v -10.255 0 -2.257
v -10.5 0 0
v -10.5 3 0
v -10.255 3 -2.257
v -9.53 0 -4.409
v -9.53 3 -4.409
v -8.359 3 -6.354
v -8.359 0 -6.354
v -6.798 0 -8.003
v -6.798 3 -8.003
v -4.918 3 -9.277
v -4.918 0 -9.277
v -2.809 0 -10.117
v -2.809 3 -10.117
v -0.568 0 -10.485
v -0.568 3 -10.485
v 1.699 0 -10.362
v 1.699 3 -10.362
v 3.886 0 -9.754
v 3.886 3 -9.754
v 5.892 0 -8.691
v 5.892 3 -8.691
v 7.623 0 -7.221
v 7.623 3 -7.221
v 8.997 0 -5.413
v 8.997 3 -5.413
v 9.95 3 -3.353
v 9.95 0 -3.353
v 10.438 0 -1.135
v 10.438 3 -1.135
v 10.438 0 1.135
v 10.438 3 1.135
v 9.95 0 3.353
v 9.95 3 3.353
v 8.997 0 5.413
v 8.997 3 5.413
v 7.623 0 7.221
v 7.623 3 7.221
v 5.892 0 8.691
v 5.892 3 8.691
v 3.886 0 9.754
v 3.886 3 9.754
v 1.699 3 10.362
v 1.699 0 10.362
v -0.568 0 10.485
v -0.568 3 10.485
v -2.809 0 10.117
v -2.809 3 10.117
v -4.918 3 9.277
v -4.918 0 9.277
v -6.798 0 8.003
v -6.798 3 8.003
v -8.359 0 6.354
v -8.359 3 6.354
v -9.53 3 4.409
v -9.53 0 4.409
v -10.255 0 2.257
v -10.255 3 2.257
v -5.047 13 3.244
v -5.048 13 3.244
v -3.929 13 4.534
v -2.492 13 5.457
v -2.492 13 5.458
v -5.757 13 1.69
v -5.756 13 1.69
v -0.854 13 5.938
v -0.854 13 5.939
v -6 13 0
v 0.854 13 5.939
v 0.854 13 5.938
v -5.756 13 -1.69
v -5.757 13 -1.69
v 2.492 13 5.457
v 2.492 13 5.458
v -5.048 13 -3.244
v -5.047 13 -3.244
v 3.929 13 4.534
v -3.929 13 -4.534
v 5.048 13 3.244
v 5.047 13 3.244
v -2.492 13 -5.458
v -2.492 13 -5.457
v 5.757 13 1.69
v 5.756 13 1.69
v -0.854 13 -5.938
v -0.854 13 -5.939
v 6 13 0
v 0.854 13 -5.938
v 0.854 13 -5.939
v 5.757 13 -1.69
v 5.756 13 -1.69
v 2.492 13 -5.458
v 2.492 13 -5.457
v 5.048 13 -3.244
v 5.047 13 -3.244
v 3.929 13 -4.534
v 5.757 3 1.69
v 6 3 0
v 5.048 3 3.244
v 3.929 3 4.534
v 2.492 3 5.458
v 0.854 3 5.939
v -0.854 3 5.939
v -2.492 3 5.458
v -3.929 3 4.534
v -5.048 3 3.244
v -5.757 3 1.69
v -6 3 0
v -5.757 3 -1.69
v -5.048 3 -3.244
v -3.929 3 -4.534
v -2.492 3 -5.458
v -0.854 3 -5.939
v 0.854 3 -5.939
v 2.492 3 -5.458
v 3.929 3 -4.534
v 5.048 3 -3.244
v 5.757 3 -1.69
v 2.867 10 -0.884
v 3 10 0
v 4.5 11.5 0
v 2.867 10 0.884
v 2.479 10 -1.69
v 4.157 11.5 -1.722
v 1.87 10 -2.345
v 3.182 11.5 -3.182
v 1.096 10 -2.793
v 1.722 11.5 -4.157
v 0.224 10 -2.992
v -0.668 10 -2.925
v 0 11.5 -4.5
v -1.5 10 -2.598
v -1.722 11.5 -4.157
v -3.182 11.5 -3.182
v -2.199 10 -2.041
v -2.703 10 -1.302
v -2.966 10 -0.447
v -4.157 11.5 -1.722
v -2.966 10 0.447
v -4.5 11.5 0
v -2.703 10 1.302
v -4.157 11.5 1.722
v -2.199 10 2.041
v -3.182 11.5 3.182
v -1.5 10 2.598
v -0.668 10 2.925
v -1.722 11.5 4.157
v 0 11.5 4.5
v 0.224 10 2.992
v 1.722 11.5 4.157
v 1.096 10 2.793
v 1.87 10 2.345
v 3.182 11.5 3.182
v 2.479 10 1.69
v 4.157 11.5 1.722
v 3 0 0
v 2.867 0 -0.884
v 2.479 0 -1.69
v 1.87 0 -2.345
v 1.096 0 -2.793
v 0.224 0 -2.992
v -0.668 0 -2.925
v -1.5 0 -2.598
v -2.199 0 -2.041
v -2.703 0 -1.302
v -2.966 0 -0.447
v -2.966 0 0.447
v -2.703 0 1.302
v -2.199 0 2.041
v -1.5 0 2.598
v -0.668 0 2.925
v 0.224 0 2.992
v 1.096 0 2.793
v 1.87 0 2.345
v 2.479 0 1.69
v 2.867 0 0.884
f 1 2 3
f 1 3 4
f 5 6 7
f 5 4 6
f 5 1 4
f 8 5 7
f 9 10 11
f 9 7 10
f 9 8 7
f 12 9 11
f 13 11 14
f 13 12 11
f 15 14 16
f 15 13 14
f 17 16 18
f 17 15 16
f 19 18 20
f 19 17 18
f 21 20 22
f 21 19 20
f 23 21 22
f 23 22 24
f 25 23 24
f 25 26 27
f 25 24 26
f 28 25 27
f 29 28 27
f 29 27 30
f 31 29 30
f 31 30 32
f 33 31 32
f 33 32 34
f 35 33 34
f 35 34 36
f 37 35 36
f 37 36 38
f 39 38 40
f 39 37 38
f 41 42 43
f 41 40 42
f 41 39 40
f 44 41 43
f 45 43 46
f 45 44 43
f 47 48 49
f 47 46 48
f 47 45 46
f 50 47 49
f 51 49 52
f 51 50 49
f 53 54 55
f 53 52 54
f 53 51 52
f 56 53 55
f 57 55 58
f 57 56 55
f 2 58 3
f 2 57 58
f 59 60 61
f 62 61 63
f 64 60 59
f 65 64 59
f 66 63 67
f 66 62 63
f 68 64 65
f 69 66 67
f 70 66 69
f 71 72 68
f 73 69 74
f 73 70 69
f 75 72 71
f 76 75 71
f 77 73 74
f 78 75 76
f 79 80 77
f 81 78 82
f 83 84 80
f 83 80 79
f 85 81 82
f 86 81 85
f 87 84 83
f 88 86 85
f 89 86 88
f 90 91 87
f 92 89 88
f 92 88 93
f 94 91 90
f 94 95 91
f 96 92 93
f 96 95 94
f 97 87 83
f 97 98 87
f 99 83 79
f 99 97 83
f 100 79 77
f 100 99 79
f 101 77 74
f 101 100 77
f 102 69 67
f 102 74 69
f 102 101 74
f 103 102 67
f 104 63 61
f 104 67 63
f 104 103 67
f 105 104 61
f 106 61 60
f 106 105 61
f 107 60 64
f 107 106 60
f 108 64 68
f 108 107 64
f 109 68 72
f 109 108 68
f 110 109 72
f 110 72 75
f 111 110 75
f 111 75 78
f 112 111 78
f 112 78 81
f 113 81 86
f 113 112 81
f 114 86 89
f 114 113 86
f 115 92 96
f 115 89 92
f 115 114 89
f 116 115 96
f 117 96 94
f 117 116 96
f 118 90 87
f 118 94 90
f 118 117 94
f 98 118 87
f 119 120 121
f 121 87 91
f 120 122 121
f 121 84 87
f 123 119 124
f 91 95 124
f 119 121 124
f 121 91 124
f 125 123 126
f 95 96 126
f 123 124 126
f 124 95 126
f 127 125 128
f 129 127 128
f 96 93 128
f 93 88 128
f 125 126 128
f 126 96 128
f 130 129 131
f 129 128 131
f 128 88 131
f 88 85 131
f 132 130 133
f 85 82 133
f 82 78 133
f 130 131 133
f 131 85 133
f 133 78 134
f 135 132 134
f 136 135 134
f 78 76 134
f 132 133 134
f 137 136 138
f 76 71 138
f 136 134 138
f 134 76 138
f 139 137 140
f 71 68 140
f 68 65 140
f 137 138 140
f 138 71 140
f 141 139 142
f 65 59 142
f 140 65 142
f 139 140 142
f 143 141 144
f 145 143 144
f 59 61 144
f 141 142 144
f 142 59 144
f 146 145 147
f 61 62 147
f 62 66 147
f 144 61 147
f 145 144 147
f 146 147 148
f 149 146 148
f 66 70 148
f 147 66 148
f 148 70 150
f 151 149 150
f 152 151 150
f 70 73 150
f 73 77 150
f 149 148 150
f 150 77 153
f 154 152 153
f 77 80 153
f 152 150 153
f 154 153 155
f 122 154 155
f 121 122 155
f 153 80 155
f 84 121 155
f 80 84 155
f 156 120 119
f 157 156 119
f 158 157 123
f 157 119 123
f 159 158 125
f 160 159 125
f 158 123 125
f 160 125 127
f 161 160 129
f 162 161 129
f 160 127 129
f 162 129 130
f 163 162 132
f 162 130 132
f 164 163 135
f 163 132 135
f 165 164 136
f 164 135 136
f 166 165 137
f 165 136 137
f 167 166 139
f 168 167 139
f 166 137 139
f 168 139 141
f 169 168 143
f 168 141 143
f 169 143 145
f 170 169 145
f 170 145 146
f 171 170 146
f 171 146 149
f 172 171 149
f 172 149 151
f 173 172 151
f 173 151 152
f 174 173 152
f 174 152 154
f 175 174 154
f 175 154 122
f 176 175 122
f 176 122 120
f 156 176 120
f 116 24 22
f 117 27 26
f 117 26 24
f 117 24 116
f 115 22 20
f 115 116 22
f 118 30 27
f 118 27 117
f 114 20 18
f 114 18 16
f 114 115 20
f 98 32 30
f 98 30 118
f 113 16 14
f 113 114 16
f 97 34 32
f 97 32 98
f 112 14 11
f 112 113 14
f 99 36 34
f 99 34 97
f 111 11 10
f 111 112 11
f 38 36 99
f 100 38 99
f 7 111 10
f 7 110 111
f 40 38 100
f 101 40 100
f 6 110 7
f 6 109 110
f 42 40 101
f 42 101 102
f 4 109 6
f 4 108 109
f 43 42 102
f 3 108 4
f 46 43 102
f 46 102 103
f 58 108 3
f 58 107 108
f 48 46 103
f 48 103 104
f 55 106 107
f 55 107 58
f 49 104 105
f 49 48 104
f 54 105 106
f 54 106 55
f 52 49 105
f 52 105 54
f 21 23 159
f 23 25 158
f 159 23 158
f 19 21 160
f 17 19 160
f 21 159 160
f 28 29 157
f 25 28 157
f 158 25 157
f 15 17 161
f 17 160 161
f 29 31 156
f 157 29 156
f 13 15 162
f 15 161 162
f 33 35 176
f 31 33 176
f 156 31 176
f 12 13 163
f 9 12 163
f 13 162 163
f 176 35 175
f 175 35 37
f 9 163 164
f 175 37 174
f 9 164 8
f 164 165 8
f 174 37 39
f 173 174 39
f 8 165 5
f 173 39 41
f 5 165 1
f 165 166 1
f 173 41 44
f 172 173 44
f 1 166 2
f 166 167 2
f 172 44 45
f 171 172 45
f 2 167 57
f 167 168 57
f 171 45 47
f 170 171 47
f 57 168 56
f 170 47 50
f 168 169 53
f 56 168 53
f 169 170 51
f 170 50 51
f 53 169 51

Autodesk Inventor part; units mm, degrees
ref_plane "YZ Plane" through (0, 0, 0) normal (1, 0, 0) x (0, 1, 0)
ref_plane "XZ Plane" through (0, 0, 0) normal (0, 1, 0) x (-1, 0, 0)
ref_plane "XY Plane" through (0, 0, 0) normal (0, 0, 1) x (1, 0, 0)
sketch "Sketch1" plane through (0, 0, 0) normal (0, 1, 0) x (-1, 0, 0)
  circle A0 centre (0, 0) radius 10.5
  dimension "d0" = 21
extrude "Extrusion1" add sketch "Sketch1" along normal blind 3
sketch "Sketch2" plane through (0, 3, 0) normal (0, 1, 0) x (1, 0, 0)
  circle A0 centre (0, 0) radius 6
  dimension "d3" = 12
extrude "Extrusion3" add sketch "Sketch2" along normal blind 10
sketch "Sketch4" plane through (0, 13, 0) normal (0, 1, 0) x (1, 0, 0)
  circle A0 centre (0, 0) radius 3
  dimension "d13" = 6
extrude "Extrusion5" cut sketch "Sketch4" against normal through all
chamfer "Chamfer1" distance 3 angle 45 1 edges at (-3, 13, 0)
properties part number "reverse gear lower cylinder ream 1"
